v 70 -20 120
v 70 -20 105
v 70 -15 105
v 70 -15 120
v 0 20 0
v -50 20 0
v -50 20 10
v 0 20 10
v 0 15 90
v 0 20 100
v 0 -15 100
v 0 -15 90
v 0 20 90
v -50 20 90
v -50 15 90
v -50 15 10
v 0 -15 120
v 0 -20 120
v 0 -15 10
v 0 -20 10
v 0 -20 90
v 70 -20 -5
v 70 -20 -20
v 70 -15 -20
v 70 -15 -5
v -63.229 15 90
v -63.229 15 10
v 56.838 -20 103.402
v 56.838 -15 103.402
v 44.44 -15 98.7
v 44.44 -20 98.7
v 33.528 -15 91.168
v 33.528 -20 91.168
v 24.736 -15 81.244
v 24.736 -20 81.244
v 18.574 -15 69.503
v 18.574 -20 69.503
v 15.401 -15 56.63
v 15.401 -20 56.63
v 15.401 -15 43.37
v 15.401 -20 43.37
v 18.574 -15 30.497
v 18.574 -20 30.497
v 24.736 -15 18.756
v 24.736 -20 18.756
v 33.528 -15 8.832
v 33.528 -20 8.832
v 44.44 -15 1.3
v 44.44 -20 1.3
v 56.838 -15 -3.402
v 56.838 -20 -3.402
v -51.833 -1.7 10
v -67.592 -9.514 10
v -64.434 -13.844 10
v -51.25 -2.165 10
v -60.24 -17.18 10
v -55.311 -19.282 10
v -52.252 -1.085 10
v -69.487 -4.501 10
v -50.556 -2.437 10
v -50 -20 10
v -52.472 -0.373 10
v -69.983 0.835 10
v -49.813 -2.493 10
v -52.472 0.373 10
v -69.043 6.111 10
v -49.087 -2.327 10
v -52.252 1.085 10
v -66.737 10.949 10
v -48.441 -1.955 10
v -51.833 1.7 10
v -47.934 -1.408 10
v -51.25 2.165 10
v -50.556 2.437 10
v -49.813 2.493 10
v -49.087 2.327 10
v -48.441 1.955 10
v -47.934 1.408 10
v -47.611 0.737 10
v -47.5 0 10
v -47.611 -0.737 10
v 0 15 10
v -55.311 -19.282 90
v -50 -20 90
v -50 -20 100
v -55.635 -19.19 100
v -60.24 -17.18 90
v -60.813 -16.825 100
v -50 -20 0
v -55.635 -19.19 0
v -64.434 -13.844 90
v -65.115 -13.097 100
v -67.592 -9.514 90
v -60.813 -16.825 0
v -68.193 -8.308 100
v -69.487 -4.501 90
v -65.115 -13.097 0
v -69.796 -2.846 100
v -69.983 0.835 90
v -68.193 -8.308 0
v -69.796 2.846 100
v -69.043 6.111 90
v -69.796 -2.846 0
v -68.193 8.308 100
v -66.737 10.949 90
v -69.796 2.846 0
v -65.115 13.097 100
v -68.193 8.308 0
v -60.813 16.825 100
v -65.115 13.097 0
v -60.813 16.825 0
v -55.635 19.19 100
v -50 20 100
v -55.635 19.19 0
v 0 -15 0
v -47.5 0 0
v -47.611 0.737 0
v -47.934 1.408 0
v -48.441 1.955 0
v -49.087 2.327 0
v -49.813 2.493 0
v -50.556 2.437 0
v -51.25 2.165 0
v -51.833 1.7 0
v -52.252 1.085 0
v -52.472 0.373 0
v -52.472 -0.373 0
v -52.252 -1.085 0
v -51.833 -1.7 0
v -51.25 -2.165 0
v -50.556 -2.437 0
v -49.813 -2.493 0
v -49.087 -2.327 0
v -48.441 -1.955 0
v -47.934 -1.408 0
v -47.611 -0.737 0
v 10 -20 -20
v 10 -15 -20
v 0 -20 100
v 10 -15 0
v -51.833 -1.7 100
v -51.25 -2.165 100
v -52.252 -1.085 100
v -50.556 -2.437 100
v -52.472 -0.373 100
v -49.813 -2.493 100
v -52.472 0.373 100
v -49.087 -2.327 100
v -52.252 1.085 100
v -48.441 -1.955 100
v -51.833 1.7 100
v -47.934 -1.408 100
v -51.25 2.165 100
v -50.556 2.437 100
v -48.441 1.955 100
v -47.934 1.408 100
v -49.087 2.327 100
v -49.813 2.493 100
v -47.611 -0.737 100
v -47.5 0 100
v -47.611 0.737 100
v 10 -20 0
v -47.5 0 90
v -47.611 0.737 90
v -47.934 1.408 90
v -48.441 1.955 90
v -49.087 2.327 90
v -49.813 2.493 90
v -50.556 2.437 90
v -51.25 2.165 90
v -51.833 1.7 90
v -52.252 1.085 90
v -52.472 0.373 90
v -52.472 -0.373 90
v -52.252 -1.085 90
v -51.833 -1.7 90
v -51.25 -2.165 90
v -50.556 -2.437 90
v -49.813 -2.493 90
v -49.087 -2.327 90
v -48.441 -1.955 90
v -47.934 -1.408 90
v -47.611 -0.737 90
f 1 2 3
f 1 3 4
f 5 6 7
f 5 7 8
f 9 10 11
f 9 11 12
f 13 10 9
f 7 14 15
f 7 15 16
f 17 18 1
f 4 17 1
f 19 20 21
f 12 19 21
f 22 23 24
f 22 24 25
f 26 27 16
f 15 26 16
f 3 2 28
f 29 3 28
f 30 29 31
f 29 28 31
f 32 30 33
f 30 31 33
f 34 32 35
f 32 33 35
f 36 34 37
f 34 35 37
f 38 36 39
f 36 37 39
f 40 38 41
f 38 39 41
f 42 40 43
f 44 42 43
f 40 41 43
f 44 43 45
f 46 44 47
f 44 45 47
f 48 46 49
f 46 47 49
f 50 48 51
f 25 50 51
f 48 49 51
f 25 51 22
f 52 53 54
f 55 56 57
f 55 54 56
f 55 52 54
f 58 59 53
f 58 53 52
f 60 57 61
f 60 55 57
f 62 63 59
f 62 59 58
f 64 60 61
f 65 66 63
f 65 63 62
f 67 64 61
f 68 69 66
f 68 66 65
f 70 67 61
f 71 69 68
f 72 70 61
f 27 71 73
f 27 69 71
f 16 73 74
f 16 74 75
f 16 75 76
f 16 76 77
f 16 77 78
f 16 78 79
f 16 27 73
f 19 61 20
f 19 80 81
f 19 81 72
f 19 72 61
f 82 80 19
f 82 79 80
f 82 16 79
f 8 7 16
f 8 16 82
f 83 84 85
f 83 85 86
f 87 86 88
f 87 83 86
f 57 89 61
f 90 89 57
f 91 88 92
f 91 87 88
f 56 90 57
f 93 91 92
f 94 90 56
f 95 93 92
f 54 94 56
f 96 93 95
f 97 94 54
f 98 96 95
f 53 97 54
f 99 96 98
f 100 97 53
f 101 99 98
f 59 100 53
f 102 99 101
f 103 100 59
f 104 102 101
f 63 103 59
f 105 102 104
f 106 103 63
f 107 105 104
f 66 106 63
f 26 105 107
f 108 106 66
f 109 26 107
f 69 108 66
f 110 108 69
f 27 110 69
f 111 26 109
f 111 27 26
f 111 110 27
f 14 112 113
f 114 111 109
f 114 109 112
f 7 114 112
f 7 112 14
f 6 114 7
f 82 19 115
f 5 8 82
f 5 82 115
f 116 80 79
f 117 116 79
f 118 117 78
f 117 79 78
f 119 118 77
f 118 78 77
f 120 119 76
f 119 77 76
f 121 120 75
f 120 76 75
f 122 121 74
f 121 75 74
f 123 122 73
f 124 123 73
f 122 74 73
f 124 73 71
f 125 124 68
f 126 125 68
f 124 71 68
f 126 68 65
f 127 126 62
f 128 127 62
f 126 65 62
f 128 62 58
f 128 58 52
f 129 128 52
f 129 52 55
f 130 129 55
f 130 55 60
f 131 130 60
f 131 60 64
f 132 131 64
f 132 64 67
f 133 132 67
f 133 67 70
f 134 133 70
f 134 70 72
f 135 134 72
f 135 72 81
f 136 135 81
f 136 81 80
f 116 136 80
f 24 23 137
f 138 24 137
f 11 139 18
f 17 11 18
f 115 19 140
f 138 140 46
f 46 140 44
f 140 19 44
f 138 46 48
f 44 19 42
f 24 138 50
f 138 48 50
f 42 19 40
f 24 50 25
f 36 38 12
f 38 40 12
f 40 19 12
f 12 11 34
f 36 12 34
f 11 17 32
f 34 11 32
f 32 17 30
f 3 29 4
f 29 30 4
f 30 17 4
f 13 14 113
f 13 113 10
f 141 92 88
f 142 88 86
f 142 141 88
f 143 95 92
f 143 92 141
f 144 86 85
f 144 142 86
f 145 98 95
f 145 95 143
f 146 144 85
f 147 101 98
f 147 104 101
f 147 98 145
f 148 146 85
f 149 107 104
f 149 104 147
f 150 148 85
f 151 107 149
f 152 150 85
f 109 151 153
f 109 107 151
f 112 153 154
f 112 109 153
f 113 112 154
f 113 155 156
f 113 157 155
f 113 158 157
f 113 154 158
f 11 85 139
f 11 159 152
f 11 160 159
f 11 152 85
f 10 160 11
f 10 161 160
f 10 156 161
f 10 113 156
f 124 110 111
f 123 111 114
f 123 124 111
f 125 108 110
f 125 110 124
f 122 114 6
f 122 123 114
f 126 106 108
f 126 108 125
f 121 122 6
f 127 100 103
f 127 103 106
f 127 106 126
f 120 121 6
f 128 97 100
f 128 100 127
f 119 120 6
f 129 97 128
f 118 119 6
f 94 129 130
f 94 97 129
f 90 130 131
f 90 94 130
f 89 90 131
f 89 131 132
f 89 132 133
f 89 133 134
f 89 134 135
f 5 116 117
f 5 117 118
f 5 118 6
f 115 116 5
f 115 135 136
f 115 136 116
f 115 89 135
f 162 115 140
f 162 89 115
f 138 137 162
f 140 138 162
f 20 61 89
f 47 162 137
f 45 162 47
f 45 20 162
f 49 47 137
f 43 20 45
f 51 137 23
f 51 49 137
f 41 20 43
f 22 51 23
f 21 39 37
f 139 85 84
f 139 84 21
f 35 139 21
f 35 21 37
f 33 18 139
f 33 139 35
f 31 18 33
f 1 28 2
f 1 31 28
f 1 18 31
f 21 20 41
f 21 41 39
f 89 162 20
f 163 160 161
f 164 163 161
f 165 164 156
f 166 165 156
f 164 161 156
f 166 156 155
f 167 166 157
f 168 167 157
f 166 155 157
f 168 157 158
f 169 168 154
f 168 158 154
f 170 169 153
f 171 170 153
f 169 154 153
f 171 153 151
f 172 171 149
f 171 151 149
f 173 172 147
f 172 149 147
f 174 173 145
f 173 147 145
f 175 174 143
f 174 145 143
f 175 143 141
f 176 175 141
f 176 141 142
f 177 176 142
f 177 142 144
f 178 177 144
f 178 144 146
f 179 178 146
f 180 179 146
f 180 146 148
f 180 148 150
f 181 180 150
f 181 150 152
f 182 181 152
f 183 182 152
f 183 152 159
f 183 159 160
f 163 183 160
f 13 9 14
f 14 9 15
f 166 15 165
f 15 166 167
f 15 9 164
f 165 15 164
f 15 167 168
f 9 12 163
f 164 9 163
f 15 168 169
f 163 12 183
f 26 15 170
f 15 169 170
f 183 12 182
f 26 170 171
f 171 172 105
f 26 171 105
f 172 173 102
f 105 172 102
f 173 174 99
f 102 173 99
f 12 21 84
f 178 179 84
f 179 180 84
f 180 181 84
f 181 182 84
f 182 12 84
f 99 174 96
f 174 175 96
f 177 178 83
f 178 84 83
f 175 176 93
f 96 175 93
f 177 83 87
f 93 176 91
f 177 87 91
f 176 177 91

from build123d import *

# Parameters (mm, degrees)
EXTRUDE_1_DEPTH     = 100
SKETCH_2_R          = 2.5
CUT_EXTRUDE_1_DEPTH = 124.693168769
SKETCH_3_W          = 20
SKETCH_3_H          = 80
SKETCH_3_W_2        = 50
CUT_EXTRUDE_2_DEPTH = 35
SKETCH_4_W          = 70
SKETCH_4_H          = 100
CUT_EXTRUDE_3_DEPTH = 35
SKETCH_5_W          = 13.228756555
SKETCH_5_H          = 5
CUT_EXTRUDE_4_DEPTH = 124.693168769
SKETCH_7_R          = 2.5
CUT_EXTRUDE_5_DEPTH = 127.984250992
SKETCH_8_W          = 50
SKETCH_8_H          = 80.000000001
CUT_EXTRUDE_7_DEPTH = 20
SKETCH_10_W         = 20
SKETCH_10_H         = 100
EXTRUDE_6_DEPTH     = 5
SKETCH_11_W         = 70
SKETCH_11_H         = 20
EXTRUDE_7_DEPTH     = 5
SKETCH_12_W         = 70
SKETCH_12_H         = 20
EXTRUDE_8_DEPTH     = 5
SKETCH_13_R         = 55
CUT_EXTRUDE_8_DEPTH = 5
SKETCH_14_W         = 10
SKETCH_14_H         = 20
CUT_EXTRUDE_9_DEPTH = 5


with BuildPart() as part:
    # 草图1 → 凸台-拉伸1 (new body)
    with BuildSketch(Plane.XY):
        with BuildLine():
            Line((-50, 20), (50, 20))
            ThreePointArc((50, 20), (70, 0), (50, -20))
            Line((50, -20), (-50, -20))
            ThreePointArc((-50, -20), (-70, 0), (-50, 20))
        make_face()
    extrude(amount=EXTRUDE_1_DEPTH)

    # 草图2 → 切除-拉伸1 (cut, through all)
    with BuildSketch(Plane.XY.offset(100)):
        with Locations((-50, 0)):
            Circle(SKETCH_2_R)
    extrude(amount=-CUT_EXTRUDE_1_DEPTH, mode=Mode.SUBTRACT)

    # 草图3 → 切除-拉伸2 (cut)
    with BuildSketch(Plane.XZ.offset(20)):
        with Locations((-60, 50)):
            Rectangle(SKETCH_3_W, SKETCH_3_H)
        with Locations((-25, 50)):
            Rectangle(SKETCH_3_W_2, SKETCH_3_H)
    extrude(amount=-CUT_EXTRUDE_2_DEPTH, mode=Mode.SUBTRACT)

    # 草图4 → 切除-拉伸3 (cut)
    with BuildSketch(Plane(origin=(0, 20, 0), x_dir=(1, 0, 0), z_dir=(0, 1, 0))):
        with Locations((35, -50)):
            Rectangle(SKETCH_4_W, SKETCH_4_H)
    extrude(amount=-CUT_EXTRUDE_3_DEPTH, mode=Mode.SUBTRACT)

    # 草图5 → 切除-拉伸4 (cut, through all)
    with BuildSketch(Plane.XY.offset(100)):
        with Locations((56.614378278, -17.5)):
            Rectangle(SKETCH_5_W, SKETCH_5_H)
    extrude(amount=-CUT_EXTRUDE_4_DEPTH, mode=Mode.SUBTRACT)

    # 草图7 → 切除-拉伸5 (cut, through all)
    with BuildSketch(Plane(origin=(0, -15, 0), x_dir=(1, 0, 0), z_dir=(0, 1, 0))):
        with Locations(Location((35, -50, 0), (0, 0, 180))):
            Circle(SKETCH_7_R)
    extrude(amount=-CUT_EXTRUDE_5_DEPTH, mode=Mode.SUBTRACT)

    # 草图8 → 切除-拉伸7 (cut)
    with BuildSketch(Plane(origin=(0, 20, 0), x_dir=(1, 0, 0), z_dir=(0, 1, 0))):
        with Locations((-25, -50.000000001)):
            Rectangle(SKETCH_8_W, SKETCH_8_H)
    extrude(amount=-CUT_EXTRUDE_7_DEPTH, mode=Mode.SUBTRACT)

    # 草图10 → 凸台-拉伸6 (add)
    with BuildSketch(Plane(origin=(0, -15, 0), x_dir=(1, 0, 0), z_dir=(0, 1, 0))):
        with Locations((60, -50)):
            Rectangle(SKETCH_10_W, SKETCH_10_H)
    extrude(amount=-EXTRUDE_6_DEPTH)

    # 草图11 → 凸台-拉伸7 (add)
    with BuildSketch(Plane(origin=(0, -20, 0), x_dir=(-1, 0, 0), z_dir=(0, -1, 0))):
        with Locations((-35, 10)):
            Rectangle(SKETCH_11_W, SKETCH_11_H)
    extrude(amount=-EXTRUDE_7_DEPTH)

    # 草图12 → 凸台-拉伸8 (add)
    with BuildSketch(Plane.XZ.offset(20)):
        with Locations((35, 110)):
            Rectangle(SKETCH_12_W, SKETCH_12_H)
    extrude(amount=-EXTRUDE_8_DEPTH)

    # 草图13 → 切除-拉伸8 (cut)
    with BuildSketch(Plane.XZ.offset(20)):
        with Locations((70, 50)):
            Circle(SKETCH_13_R)
    extrude(amount=-CUT_EXTRUDE_8_DEPTH, mode=Mode.SUBTRACT)

    # 草图14 → 切除-拉伸9 (cut)
    with BuildSketch(Plane.XZ.offset(20)):
        with Locations((5, -10)):
            Rectangle(SKETCH_14_W, SKETCH_14_H)
    extrude(amount=-CUT_EXTRUDE_9_DEPTH, mode=Mode.SUBTRACT)


solid = part.part
